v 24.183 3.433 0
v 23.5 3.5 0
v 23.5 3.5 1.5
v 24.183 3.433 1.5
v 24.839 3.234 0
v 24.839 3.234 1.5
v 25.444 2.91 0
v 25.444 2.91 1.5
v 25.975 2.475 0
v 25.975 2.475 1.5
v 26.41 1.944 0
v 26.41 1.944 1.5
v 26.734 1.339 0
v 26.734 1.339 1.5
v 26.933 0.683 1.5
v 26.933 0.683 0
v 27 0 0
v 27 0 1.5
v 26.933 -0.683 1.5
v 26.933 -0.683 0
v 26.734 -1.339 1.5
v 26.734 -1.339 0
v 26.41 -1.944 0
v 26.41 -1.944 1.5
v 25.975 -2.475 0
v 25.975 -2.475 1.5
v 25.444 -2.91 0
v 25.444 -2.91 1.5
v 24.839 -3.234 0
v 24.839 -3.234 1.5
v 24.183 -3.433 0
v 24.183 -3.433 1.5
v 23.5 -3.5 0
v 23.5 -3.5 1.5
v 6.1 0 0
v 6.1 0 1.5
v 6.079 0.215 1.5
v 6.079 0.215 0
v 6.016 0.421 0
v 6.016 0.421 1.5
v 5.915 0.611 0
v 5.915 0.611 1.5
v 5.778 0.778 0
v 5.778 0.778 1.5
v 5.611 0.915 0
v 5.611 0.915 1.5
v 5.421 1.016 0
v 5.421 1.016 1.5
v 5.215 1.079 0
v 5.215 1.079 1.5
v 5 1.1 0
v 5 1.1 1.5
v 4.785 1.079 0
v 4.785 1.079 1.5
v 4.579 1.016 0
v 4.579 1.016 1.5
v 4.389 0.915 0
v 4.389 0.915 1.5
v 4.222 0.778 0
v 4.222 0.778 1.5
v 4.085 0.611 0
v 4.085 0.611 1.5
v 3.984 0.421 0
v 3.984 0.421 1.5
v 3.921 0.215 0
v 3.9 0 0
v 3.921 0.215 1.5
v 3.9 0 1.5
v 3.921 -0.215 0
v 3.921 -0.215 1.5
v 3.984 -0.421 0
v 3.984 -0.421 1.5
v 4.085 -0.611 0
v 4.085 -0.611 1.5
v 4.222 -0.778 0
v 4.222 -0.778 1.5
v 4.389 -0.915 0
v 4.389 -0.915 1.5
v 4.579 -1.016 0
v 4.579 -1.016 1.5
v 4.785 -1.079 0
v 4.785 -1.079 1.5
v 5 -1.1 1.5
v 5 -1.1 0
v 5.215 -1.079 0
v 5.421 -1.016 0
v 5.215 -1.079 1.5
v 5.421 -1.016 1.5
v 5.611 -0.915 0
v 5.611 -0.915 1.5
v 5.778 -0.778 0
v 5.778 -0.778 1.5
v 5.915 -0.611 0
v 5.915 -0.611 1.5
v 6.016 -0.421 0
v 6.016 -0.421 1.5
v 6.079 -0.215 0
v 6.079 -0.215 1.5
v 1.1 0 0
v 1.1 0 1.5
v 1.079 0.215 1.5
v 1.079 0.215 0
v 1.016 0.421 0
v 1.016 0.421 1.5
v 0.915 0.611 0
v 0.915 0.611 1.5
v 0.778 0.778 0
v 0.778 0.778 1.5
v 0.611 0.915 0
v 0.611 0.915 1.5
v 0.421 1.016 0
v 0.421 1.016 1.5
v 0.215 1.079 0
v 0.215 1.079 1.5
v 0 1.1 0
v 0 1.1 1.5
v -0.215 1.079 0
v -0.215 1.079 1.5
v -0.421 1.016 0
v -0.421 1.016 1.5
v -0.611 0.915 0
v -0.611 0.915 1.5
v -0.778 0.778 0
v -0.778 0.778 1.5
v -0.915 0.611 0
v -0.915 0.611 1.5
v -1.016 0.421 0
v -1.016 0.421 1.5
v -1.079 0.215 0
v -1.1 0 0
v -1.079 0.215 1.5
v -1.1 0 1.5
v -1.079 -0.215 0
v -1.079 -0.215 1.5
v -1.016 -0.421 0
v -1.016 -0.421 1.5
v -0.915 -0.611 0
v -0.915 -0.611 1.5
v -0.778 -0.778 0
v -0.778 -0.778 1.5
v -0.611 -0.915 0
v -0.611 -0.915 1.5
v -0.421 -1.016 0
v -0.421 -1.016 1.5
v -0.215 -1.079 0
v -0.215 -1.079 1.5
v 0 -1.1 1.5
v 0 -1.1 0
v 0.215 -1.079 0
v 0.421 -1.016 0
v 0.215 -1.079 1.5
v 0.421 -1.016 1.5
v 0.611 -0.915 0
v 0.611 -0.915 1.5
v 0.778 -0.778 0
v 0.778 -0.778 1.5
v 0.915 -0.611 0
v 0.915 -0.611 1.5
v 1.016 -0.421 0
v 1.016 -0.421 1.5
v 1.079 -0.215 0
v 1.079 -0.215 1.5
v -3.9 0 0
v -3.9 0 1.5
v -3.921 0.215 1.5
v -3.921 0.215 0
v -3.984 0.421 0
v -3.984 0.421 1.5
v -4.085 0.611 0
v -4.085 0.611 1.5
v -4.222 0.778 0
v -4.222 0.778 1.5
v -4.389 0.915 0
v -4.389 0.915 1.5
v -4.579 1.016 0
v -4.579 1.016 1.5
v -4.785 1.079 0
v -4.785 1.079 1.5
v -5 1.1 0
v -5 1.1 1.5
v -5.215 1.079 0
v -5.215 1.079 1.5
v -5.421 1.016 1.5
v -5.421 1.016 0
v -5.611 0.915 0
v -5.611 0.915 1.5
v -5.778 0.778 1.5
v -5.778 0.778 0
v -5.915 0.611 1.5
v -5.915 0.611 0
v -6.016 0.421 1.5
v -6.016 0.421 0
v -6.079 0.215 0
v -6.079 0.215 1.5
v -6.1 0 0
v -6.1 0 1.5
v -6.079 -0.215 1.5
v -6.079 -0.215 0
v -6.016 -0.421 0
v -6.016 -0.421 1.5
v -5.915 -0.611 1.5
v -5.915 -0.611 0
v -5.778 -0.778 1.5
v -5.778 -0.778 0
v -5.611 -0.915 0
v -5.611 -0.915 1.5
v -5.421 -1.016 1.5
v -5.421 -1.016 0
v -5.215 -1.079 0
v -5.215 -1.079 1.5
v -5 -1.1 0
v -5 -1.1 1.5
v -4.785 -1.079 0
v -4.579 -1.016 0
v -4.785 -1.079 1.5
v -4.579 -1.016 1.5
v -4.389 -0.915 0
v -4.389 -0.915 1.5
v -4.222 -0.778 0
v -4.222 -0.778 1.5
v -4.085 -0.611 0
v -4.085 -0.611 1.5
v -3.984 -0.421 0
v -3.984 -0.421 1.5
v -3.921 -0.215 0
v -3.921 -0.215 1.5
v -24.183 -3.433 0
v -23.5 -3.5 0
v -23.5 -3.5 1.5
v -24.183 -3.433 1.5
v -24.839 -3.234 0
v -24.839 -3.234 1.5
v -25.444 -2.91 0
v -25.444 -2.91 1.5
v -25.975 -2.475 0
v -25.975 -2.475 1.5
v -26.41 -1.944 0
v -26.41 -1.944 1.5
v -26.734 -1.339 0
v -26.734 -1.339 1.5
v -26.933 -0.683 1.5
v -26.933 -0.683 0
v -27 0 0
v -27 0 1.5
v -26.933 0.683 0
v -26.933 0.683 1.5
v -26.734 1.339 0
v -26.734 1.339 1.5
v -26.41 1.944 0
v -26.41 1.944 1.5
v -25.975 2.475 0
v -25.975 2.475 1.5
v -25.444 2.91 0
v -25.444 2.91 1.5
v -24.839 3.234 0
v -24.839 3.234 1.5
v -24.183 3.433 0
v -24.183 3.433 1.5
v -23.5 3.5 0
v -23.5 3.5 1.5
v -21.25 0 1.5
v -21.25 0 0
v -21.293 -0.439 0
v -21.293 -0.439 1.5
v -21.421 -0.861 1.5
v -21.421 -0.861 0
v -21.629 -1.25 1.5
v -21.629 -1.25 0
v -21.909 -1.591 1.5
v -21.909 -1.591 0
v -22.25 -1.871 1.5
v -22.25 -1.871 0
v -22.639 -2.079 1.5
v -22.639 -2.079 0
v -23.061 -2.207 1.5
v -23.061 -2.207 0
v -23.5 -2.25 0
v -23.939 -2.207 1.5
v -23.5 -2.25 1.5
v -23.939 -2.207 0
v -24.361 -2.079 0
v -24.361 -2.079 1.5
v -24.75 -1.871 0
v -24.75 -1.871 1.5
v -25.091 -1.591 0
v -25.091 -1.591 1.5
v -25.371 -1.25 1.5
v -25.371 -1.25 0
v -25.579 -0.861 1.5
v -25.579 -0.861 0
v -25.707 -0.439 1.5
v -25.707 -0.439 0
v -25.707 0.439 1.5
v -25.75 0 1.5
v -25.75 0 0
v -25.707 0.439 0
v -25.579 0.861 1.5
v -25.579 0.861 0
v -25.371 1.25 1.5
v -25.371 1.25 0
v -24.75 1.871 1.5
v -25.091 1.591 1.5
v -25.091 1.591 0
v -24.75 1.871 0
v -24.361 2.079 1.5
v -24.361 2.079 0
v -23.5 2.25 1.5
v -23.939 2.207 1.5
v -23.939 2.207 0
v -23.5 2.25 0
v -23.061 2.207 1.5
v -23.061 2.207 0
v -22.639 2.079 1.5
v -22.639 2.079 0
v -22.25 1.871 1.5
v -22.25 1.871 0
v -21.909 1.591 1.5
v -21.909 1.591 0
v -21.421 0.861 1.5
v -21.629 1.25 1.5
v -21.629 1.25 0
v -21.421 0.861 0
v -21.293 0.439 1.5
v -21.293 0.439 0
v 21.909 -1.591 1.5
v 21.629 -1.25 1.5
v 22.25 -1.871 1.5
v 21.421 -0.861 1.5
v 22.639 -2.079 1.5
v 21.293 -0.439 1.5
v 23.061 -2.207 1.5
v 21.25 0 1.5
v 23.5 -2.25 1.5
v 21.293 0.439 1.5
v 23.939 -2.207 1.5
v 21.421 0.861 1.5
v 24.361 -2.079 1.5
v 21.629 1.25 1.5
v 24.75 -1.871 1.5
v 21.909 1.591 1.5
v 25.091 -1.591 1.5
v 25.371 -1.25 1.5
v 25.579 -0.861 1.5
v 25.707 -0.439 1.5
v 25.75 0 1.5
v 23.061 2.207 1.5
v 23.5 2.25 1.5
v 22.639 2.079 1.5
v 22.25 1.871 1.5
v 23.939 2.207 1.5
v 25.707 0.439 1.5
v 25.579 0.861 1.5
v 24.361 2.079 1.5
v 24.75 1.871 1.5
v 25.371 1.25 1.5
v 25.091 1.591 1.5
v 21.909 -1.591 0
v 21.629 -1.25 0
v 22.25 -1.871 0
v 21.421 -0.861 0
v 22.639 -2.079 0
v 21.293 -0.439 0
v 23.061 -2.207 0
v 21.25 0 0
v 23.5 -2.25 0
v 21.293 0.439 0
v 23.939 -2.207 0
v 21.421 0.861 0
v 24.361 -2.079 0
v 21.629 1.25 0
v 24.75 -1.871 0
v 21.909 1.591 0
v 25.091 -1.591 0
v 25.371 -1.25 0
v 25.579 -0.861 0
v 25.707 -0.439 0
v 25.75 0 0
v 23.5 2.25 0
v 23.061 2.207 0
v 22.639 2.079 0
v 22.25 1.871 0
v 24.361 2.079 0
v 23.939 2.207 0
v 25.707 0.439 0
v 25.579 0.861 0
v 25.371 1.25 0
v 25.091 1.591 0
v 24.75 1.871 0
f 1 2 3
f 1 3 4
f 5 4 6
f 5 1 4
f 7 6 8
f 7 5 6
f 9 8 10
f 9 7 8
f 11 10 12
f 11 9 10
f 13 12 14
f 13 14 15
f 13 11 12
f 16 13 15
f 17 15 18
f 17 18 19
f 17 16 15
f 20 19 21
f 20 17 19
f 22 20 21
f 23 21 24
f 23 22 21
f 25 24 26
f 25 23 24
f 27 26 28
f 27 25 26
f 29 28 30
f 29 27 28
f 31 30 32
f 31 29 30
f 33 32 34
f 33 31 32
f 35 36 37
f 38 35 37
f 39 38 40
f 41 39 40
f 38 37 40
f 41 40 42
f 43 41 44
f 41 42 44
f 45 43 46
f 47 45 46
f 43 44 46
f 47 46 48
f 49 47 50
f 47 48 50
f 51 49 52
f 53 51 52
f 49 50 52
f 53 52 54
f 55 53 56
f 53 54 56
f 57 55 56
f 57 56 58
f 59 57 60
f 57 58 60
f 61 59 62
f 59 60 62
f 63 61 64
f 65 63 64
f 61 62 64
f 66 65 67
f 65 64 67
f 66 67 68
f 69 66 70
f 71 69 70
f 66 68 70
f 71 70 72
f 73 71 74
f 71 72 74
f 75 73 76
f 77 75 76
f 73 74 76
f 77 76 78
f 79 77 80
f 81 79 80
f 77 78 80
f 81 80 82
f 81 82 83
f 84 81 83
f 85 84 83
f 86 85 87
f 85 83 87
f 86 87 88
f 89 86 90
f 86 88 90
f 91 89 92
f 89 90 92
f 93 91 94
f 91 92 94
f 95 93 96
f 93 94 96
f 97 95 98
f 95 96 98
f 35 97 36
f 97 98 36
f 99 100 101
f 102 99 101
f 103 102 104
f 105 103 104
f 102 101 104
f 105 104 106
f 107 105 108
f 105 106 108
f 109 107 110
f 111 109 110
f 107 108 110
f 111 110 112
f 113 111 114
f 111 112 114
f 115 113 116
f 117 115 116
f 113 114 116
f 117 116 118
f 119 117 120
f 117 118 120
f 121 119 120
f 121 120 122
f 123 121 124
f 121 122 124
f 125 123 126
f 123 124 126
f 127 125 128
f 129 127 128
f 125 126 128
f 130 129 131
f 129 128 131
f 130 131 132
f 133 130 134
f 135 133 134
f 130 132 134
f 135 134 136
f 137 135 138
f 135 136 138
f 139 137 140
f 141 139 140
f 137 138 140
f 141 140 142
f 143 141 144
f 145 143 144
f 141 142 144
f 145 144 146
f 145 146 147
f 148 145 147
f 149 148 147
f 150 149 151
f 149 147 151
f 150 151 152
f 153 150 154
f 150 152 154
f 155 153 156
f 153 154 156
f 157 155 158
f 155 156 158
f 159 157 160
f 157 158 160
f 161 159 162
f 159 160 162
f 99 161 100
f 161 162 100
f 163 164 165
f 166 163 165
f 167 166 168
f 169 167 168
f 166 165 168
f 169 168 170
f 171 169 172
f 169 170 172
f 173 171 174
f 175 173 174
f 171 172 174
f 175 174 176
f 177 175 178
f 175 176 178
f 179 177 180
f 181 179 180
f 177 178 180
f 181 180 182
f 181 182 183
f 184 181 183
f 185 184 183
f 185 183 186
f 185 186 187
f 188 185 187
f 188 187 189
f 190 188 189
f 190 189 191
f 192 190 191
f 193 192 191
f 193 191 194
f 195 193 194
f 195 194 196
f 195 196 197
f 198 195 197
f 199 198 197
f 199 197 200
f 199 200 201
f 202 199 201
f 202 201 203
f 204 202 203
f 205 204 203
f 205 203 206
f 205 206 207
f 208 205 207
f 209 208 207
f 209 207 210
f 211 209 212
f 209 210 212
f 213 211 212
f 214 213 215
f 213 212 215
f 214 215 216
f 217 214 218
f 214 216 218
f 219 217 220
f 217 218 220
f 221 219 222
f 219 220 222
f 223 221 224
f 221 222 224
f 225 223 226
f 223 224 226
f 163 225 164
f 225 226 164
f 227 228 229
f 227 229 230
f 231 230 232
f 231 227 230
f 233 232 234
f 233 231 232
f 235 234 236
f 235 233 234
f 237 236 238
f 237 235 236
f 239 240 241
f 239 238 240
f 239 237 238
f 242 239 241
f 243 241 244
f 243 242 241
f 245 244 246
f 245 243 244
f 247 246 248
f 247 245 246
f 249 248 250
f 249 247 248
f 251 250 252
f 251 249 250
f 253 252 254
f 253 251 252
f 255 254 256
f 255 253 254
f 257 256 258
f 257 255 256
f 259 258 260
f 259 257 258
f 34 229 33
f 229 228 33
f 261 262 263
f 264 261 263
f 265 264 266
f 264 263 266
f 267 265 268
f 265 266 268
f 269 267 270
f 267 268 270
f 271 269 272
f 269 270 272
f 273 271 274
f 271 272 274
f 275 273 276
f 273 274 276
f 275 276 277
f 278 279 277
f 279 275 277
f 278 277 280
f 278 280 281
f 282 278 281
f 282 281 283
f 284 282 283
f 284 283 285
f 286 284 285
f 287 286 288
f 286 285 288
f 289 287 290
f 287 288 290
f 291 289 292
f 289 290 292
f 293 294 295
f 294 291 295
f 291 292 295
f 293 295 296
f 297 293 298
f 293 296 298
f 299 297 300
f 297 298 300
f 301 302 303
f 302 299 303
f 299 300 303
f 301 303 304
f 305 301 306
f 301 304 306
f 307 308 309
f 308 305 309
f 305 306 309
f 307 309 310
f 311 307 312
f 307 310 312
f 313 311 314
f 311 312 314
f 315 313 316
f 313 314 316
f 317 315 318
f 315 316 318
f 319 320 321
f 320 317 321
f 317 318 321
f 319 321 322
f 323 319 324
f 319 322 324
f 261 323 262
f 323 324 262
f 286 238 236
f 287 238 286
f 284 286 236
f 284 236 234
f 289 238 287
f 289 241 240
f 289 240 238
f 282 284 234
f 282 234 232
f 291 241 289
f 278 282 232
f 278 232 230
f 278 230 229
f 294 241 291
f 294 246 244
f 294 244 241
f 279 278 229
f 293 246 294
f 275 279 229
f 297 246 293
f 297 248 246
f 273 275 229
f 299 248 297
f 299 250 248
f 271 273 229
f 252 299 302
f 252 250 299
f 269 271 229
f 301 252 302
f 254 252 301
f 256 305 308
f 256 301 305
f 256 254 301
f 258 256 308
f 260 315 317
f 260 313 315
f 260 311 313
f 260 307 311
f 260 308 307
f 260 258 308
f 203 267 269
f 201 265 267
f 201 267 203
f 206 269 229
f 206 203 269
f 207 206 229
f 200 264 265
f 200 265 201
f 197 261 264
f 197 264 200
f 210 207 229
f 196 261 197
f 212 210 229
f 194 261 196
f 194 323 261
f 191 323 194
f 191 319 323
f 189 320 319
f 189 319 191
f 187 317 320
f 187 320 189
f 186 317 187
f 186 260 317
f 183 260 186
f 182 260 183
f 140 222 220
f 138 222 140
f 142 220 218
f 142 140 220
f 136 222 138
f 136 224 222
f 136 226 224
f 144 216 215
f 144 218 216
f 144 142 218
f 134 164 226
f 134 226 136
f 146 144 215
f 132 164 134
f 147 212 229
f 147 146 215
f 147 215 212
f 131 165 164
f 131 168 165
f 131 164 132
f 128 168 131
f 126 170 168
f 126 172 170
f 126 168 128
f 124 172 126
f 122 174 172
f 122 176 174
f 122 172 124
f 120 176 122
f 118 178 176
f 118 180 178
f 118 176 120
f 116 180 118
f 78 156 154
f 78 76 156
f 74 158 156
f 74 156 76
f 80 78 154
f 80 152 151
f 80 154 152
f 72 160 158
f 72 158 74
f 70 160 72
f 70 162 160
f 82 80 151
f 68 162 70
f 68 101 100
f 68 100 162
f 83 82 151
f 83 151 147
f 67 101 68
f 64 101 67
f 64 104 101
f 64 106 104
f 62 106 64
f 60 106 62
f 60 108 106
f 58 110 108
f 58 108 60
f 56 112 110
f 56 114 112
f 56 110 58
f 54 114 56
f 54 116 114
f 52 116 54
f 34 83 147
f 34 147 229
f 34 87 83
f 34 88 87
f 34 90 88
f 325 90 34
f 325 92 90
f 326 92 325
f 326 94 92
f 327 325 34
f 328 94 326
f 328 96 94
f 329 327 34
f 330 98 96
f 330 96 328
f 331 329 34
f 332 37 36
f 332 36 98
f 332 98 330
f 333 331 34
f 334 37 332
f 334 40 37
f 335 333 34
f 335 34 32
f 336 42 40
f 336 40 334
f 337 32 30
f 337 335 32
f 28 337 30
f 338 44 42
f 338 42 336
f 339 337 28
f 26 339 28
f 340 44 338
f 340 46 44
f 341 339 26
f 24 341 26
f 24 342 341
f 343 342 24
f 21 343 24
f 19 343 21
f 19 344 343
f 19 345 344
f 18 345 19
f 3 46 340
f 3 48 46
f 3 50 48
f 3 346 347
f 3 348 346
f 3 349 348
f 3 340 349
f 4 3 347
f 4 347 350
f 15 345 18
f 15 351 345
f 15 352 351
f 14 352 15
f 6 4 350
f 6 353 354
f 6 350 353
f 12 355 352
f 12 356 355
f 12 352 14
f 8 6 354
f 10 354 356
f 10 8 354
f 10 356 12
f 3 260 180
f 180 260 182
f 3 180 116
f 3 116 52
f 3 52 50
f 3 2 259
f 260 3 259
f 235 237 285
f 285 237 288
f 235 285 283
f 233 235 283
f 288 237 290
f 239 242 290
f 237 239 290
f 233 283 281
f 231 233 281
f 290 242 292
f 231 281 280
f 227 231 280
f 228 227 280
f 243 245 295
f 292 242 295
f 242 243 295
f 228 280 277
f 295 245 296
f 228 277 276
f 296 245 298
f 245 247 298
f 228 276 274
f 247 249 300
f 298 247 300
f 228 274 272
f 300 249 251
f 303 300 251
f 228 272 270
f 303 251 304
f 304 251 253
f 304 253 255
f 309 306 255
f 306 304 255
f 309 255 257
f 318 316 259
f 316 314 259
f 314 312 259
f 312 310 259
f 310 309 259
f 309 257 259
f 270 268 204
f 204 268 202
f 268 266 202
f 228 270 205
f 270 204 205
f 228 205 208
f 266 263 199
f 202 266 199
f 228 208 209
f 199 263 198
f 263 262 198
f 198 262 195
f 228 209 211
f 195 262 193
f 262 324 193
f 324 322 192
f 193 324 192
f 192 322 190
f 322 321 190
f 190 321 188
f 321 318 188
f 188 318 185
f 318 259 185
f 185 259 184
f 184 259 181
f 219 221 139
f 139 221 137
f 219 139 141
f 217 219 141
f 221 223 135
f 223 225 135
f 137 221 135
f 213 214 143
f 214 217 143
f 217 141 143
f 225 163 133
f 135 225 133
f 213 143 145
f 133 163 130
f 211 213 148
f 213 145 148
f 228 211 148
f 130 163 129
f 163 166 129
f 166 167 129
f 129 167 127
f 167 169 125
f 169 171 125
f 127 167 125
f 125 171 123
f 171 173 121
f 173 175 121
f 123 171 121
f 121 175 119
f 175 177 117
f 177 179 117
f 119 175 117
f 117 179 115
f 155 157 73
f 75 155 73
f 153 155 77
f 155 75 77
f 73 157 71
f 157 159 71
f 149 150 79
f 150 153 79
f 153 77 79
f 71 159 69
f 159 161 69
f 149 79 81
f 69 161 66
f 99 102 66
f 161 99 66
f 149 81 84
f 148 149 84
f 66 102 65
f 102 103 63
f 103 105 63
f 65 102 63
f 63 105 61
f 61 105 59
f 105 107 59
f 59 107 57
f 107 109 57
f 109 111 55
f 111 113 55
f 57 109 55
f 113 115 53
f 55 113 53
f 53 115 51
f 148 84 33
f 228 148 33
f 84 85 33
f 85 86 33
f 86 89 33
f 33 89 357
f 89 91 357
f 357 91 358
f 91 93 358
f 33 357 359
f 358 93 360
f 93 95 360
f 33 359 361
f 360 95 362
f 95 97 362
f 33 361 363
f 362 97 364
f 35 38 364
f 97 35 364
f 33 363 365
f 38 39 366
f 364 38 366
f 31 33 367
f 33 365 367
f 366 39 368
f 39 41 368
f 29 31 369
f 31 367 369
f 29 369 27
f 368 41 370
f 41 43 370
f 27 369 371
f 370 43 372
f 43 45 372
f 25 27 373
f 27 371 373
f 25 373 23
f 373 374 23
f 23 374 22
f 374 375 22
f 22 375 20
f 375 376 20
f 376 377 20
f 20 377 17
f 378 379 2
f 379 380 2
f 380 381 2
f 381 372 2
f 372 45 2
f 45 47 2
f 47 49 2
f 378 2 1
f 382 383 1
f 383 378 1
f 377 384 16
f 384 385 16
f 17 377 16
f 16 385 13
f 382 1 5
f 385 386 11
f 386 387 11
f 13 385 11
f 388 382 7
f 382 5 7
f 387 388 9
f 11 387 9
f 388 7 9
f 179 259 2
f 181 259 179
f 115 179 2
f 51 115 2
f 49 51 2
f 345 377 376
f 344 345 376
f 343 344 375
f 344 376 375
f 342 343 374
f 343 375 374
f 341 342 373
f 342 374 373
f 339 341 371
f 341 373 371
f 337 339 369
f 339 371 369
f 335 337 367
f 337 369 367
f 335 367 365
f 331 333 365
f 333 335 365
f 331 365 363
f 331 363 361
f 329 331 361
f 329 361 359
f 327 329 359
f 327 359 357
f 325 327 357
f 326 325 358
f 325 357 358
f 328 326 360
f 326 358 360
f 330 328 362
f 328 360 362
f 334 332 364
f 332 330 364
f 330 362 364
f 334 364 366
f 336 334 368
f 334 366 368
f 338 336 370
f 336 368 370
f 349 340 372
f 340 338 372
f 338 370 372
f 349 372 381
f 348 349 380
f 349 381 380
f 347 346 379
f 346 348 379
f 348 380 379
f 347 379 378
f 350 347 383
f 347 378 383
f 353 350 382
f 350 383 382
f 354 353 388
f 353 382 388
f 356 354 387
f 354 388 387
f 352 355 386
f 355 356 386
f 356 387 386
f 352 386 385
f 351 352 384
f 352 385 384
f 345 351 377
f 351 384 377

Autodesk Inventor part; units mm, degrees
ref_plane "YZ Plane" through (0, 0, 0) normal (1, 0, 0) x (0, 1, 0)
ref_plane "XZ Plane" through (0, 0, 0) normal (0, 1, 0) x (-1, 0, 0)
ref_plane "XY Plane" through (0, 0, 0) normal (0, 0, 1) x (1, 0, 0)
sketch "スケッチ1" plane through (0, 0, 0) normal (0, 0, 1) x (1, 0, 0)
  line L0 (-23.5, -3.5) -> (23.5, -3.5)
  line L1 (23.5, -3.5) -> (23.5, 3.5) construction
  line L2 (23.5, 3.5) -> (-23.5, 3.5)
  line L3 (-23.5, 3.5) -> (-23.5, -3.5) construction
  line L4 (-23.5, -3.5) -> (23.5, 3.5) construction
  line L5 (23.5, -3.5) -> (-23.5, 3.5) construction
  circle A0 centre (-23.5, 0) radius 3.5
  line L6 (0, 3.5) -> (0, -3.5) construction
  circle A1 centre (23.5, 0) radius 3.5
  circle A2 centre (-23.5, 0) radius 2.25
  circle A3 centre (23.5, 0) radius 2.25
  point P0 (0, 0)
  point P1 (23.5, -3.5)
  point P2 (23.5, 3.5)
  dimension "d0" = 7
  dimension "d1" = 47
  dimension "d2" = 4.5
extrude "押し出し1" add sketch "スケッチ1" along normal blind 1.5
sketch "スケッチ2" plane through (0, 0, 1.5) normal (0, 0, 1) x (1, 0, 0)
  circle A0 centre (23.5, 0) radius 2.25 construction
  circle A1 centre (-23.5, 0) radius 2.25 construction
  line L0 (23.5, 0) -> (-23.5, 0) construction
  circle A2 centre (0, 0) radius 1.1
  circle A3 centre (-5, 0) radius 1.1
  circle A4 centre (-10, 0) radius 1.1
  circle A5 centre (-15, 0) radius 1.1
  circle A6 centre (-20, 0) radius 1.1
  circle A7 centre (5, 0) radius 1.1
  circle A8 centre (0, 0) radius 1.1
  circle A9 centre (-5, 0) radius 1.1
  circle A10 centre (-10, 0) radius 1.1
  circle A11 centre (-15, 0) radius 1.1
  circle A12 centre (10, 0) radius 1.1
  circle A13 centre (5, 0) radius 1.1
  circle A14 centre (0, 0) radius 1.1
  circle A15 centre (-5, 0) radius 1.1
  circle A16 centre (-10, 0) radius 1.1
  circle A17 centre (15, 0) radius 1.1
  circle A18 centre (10, 0) radius 1.1
  circle A19 centre (5, 0) radius 1.1
  circle A20 centre (0, 0) radius 1.1
  circle A21 centre (-5, 0) radius 1.1
  circle A22 centre (20, 0) radius 1.1
  circle A23 centre (15, 0) radius 1.1
  circle A24 centre (10, 0) radius 1.1
  circle A25 centre (5, 0) radius 1.1
  circle A26 centre (0, 0) radius 1.1
  dimension "d5" = 2.2
  dimension "d8" = 5
  dimension "d11" = 5
extrude "押し出し2" cut sketch "スケッチ2" against normal through all contours A2 | A3 | A7
properties part number "free_link" material "アルミニウム 2014-T4"
